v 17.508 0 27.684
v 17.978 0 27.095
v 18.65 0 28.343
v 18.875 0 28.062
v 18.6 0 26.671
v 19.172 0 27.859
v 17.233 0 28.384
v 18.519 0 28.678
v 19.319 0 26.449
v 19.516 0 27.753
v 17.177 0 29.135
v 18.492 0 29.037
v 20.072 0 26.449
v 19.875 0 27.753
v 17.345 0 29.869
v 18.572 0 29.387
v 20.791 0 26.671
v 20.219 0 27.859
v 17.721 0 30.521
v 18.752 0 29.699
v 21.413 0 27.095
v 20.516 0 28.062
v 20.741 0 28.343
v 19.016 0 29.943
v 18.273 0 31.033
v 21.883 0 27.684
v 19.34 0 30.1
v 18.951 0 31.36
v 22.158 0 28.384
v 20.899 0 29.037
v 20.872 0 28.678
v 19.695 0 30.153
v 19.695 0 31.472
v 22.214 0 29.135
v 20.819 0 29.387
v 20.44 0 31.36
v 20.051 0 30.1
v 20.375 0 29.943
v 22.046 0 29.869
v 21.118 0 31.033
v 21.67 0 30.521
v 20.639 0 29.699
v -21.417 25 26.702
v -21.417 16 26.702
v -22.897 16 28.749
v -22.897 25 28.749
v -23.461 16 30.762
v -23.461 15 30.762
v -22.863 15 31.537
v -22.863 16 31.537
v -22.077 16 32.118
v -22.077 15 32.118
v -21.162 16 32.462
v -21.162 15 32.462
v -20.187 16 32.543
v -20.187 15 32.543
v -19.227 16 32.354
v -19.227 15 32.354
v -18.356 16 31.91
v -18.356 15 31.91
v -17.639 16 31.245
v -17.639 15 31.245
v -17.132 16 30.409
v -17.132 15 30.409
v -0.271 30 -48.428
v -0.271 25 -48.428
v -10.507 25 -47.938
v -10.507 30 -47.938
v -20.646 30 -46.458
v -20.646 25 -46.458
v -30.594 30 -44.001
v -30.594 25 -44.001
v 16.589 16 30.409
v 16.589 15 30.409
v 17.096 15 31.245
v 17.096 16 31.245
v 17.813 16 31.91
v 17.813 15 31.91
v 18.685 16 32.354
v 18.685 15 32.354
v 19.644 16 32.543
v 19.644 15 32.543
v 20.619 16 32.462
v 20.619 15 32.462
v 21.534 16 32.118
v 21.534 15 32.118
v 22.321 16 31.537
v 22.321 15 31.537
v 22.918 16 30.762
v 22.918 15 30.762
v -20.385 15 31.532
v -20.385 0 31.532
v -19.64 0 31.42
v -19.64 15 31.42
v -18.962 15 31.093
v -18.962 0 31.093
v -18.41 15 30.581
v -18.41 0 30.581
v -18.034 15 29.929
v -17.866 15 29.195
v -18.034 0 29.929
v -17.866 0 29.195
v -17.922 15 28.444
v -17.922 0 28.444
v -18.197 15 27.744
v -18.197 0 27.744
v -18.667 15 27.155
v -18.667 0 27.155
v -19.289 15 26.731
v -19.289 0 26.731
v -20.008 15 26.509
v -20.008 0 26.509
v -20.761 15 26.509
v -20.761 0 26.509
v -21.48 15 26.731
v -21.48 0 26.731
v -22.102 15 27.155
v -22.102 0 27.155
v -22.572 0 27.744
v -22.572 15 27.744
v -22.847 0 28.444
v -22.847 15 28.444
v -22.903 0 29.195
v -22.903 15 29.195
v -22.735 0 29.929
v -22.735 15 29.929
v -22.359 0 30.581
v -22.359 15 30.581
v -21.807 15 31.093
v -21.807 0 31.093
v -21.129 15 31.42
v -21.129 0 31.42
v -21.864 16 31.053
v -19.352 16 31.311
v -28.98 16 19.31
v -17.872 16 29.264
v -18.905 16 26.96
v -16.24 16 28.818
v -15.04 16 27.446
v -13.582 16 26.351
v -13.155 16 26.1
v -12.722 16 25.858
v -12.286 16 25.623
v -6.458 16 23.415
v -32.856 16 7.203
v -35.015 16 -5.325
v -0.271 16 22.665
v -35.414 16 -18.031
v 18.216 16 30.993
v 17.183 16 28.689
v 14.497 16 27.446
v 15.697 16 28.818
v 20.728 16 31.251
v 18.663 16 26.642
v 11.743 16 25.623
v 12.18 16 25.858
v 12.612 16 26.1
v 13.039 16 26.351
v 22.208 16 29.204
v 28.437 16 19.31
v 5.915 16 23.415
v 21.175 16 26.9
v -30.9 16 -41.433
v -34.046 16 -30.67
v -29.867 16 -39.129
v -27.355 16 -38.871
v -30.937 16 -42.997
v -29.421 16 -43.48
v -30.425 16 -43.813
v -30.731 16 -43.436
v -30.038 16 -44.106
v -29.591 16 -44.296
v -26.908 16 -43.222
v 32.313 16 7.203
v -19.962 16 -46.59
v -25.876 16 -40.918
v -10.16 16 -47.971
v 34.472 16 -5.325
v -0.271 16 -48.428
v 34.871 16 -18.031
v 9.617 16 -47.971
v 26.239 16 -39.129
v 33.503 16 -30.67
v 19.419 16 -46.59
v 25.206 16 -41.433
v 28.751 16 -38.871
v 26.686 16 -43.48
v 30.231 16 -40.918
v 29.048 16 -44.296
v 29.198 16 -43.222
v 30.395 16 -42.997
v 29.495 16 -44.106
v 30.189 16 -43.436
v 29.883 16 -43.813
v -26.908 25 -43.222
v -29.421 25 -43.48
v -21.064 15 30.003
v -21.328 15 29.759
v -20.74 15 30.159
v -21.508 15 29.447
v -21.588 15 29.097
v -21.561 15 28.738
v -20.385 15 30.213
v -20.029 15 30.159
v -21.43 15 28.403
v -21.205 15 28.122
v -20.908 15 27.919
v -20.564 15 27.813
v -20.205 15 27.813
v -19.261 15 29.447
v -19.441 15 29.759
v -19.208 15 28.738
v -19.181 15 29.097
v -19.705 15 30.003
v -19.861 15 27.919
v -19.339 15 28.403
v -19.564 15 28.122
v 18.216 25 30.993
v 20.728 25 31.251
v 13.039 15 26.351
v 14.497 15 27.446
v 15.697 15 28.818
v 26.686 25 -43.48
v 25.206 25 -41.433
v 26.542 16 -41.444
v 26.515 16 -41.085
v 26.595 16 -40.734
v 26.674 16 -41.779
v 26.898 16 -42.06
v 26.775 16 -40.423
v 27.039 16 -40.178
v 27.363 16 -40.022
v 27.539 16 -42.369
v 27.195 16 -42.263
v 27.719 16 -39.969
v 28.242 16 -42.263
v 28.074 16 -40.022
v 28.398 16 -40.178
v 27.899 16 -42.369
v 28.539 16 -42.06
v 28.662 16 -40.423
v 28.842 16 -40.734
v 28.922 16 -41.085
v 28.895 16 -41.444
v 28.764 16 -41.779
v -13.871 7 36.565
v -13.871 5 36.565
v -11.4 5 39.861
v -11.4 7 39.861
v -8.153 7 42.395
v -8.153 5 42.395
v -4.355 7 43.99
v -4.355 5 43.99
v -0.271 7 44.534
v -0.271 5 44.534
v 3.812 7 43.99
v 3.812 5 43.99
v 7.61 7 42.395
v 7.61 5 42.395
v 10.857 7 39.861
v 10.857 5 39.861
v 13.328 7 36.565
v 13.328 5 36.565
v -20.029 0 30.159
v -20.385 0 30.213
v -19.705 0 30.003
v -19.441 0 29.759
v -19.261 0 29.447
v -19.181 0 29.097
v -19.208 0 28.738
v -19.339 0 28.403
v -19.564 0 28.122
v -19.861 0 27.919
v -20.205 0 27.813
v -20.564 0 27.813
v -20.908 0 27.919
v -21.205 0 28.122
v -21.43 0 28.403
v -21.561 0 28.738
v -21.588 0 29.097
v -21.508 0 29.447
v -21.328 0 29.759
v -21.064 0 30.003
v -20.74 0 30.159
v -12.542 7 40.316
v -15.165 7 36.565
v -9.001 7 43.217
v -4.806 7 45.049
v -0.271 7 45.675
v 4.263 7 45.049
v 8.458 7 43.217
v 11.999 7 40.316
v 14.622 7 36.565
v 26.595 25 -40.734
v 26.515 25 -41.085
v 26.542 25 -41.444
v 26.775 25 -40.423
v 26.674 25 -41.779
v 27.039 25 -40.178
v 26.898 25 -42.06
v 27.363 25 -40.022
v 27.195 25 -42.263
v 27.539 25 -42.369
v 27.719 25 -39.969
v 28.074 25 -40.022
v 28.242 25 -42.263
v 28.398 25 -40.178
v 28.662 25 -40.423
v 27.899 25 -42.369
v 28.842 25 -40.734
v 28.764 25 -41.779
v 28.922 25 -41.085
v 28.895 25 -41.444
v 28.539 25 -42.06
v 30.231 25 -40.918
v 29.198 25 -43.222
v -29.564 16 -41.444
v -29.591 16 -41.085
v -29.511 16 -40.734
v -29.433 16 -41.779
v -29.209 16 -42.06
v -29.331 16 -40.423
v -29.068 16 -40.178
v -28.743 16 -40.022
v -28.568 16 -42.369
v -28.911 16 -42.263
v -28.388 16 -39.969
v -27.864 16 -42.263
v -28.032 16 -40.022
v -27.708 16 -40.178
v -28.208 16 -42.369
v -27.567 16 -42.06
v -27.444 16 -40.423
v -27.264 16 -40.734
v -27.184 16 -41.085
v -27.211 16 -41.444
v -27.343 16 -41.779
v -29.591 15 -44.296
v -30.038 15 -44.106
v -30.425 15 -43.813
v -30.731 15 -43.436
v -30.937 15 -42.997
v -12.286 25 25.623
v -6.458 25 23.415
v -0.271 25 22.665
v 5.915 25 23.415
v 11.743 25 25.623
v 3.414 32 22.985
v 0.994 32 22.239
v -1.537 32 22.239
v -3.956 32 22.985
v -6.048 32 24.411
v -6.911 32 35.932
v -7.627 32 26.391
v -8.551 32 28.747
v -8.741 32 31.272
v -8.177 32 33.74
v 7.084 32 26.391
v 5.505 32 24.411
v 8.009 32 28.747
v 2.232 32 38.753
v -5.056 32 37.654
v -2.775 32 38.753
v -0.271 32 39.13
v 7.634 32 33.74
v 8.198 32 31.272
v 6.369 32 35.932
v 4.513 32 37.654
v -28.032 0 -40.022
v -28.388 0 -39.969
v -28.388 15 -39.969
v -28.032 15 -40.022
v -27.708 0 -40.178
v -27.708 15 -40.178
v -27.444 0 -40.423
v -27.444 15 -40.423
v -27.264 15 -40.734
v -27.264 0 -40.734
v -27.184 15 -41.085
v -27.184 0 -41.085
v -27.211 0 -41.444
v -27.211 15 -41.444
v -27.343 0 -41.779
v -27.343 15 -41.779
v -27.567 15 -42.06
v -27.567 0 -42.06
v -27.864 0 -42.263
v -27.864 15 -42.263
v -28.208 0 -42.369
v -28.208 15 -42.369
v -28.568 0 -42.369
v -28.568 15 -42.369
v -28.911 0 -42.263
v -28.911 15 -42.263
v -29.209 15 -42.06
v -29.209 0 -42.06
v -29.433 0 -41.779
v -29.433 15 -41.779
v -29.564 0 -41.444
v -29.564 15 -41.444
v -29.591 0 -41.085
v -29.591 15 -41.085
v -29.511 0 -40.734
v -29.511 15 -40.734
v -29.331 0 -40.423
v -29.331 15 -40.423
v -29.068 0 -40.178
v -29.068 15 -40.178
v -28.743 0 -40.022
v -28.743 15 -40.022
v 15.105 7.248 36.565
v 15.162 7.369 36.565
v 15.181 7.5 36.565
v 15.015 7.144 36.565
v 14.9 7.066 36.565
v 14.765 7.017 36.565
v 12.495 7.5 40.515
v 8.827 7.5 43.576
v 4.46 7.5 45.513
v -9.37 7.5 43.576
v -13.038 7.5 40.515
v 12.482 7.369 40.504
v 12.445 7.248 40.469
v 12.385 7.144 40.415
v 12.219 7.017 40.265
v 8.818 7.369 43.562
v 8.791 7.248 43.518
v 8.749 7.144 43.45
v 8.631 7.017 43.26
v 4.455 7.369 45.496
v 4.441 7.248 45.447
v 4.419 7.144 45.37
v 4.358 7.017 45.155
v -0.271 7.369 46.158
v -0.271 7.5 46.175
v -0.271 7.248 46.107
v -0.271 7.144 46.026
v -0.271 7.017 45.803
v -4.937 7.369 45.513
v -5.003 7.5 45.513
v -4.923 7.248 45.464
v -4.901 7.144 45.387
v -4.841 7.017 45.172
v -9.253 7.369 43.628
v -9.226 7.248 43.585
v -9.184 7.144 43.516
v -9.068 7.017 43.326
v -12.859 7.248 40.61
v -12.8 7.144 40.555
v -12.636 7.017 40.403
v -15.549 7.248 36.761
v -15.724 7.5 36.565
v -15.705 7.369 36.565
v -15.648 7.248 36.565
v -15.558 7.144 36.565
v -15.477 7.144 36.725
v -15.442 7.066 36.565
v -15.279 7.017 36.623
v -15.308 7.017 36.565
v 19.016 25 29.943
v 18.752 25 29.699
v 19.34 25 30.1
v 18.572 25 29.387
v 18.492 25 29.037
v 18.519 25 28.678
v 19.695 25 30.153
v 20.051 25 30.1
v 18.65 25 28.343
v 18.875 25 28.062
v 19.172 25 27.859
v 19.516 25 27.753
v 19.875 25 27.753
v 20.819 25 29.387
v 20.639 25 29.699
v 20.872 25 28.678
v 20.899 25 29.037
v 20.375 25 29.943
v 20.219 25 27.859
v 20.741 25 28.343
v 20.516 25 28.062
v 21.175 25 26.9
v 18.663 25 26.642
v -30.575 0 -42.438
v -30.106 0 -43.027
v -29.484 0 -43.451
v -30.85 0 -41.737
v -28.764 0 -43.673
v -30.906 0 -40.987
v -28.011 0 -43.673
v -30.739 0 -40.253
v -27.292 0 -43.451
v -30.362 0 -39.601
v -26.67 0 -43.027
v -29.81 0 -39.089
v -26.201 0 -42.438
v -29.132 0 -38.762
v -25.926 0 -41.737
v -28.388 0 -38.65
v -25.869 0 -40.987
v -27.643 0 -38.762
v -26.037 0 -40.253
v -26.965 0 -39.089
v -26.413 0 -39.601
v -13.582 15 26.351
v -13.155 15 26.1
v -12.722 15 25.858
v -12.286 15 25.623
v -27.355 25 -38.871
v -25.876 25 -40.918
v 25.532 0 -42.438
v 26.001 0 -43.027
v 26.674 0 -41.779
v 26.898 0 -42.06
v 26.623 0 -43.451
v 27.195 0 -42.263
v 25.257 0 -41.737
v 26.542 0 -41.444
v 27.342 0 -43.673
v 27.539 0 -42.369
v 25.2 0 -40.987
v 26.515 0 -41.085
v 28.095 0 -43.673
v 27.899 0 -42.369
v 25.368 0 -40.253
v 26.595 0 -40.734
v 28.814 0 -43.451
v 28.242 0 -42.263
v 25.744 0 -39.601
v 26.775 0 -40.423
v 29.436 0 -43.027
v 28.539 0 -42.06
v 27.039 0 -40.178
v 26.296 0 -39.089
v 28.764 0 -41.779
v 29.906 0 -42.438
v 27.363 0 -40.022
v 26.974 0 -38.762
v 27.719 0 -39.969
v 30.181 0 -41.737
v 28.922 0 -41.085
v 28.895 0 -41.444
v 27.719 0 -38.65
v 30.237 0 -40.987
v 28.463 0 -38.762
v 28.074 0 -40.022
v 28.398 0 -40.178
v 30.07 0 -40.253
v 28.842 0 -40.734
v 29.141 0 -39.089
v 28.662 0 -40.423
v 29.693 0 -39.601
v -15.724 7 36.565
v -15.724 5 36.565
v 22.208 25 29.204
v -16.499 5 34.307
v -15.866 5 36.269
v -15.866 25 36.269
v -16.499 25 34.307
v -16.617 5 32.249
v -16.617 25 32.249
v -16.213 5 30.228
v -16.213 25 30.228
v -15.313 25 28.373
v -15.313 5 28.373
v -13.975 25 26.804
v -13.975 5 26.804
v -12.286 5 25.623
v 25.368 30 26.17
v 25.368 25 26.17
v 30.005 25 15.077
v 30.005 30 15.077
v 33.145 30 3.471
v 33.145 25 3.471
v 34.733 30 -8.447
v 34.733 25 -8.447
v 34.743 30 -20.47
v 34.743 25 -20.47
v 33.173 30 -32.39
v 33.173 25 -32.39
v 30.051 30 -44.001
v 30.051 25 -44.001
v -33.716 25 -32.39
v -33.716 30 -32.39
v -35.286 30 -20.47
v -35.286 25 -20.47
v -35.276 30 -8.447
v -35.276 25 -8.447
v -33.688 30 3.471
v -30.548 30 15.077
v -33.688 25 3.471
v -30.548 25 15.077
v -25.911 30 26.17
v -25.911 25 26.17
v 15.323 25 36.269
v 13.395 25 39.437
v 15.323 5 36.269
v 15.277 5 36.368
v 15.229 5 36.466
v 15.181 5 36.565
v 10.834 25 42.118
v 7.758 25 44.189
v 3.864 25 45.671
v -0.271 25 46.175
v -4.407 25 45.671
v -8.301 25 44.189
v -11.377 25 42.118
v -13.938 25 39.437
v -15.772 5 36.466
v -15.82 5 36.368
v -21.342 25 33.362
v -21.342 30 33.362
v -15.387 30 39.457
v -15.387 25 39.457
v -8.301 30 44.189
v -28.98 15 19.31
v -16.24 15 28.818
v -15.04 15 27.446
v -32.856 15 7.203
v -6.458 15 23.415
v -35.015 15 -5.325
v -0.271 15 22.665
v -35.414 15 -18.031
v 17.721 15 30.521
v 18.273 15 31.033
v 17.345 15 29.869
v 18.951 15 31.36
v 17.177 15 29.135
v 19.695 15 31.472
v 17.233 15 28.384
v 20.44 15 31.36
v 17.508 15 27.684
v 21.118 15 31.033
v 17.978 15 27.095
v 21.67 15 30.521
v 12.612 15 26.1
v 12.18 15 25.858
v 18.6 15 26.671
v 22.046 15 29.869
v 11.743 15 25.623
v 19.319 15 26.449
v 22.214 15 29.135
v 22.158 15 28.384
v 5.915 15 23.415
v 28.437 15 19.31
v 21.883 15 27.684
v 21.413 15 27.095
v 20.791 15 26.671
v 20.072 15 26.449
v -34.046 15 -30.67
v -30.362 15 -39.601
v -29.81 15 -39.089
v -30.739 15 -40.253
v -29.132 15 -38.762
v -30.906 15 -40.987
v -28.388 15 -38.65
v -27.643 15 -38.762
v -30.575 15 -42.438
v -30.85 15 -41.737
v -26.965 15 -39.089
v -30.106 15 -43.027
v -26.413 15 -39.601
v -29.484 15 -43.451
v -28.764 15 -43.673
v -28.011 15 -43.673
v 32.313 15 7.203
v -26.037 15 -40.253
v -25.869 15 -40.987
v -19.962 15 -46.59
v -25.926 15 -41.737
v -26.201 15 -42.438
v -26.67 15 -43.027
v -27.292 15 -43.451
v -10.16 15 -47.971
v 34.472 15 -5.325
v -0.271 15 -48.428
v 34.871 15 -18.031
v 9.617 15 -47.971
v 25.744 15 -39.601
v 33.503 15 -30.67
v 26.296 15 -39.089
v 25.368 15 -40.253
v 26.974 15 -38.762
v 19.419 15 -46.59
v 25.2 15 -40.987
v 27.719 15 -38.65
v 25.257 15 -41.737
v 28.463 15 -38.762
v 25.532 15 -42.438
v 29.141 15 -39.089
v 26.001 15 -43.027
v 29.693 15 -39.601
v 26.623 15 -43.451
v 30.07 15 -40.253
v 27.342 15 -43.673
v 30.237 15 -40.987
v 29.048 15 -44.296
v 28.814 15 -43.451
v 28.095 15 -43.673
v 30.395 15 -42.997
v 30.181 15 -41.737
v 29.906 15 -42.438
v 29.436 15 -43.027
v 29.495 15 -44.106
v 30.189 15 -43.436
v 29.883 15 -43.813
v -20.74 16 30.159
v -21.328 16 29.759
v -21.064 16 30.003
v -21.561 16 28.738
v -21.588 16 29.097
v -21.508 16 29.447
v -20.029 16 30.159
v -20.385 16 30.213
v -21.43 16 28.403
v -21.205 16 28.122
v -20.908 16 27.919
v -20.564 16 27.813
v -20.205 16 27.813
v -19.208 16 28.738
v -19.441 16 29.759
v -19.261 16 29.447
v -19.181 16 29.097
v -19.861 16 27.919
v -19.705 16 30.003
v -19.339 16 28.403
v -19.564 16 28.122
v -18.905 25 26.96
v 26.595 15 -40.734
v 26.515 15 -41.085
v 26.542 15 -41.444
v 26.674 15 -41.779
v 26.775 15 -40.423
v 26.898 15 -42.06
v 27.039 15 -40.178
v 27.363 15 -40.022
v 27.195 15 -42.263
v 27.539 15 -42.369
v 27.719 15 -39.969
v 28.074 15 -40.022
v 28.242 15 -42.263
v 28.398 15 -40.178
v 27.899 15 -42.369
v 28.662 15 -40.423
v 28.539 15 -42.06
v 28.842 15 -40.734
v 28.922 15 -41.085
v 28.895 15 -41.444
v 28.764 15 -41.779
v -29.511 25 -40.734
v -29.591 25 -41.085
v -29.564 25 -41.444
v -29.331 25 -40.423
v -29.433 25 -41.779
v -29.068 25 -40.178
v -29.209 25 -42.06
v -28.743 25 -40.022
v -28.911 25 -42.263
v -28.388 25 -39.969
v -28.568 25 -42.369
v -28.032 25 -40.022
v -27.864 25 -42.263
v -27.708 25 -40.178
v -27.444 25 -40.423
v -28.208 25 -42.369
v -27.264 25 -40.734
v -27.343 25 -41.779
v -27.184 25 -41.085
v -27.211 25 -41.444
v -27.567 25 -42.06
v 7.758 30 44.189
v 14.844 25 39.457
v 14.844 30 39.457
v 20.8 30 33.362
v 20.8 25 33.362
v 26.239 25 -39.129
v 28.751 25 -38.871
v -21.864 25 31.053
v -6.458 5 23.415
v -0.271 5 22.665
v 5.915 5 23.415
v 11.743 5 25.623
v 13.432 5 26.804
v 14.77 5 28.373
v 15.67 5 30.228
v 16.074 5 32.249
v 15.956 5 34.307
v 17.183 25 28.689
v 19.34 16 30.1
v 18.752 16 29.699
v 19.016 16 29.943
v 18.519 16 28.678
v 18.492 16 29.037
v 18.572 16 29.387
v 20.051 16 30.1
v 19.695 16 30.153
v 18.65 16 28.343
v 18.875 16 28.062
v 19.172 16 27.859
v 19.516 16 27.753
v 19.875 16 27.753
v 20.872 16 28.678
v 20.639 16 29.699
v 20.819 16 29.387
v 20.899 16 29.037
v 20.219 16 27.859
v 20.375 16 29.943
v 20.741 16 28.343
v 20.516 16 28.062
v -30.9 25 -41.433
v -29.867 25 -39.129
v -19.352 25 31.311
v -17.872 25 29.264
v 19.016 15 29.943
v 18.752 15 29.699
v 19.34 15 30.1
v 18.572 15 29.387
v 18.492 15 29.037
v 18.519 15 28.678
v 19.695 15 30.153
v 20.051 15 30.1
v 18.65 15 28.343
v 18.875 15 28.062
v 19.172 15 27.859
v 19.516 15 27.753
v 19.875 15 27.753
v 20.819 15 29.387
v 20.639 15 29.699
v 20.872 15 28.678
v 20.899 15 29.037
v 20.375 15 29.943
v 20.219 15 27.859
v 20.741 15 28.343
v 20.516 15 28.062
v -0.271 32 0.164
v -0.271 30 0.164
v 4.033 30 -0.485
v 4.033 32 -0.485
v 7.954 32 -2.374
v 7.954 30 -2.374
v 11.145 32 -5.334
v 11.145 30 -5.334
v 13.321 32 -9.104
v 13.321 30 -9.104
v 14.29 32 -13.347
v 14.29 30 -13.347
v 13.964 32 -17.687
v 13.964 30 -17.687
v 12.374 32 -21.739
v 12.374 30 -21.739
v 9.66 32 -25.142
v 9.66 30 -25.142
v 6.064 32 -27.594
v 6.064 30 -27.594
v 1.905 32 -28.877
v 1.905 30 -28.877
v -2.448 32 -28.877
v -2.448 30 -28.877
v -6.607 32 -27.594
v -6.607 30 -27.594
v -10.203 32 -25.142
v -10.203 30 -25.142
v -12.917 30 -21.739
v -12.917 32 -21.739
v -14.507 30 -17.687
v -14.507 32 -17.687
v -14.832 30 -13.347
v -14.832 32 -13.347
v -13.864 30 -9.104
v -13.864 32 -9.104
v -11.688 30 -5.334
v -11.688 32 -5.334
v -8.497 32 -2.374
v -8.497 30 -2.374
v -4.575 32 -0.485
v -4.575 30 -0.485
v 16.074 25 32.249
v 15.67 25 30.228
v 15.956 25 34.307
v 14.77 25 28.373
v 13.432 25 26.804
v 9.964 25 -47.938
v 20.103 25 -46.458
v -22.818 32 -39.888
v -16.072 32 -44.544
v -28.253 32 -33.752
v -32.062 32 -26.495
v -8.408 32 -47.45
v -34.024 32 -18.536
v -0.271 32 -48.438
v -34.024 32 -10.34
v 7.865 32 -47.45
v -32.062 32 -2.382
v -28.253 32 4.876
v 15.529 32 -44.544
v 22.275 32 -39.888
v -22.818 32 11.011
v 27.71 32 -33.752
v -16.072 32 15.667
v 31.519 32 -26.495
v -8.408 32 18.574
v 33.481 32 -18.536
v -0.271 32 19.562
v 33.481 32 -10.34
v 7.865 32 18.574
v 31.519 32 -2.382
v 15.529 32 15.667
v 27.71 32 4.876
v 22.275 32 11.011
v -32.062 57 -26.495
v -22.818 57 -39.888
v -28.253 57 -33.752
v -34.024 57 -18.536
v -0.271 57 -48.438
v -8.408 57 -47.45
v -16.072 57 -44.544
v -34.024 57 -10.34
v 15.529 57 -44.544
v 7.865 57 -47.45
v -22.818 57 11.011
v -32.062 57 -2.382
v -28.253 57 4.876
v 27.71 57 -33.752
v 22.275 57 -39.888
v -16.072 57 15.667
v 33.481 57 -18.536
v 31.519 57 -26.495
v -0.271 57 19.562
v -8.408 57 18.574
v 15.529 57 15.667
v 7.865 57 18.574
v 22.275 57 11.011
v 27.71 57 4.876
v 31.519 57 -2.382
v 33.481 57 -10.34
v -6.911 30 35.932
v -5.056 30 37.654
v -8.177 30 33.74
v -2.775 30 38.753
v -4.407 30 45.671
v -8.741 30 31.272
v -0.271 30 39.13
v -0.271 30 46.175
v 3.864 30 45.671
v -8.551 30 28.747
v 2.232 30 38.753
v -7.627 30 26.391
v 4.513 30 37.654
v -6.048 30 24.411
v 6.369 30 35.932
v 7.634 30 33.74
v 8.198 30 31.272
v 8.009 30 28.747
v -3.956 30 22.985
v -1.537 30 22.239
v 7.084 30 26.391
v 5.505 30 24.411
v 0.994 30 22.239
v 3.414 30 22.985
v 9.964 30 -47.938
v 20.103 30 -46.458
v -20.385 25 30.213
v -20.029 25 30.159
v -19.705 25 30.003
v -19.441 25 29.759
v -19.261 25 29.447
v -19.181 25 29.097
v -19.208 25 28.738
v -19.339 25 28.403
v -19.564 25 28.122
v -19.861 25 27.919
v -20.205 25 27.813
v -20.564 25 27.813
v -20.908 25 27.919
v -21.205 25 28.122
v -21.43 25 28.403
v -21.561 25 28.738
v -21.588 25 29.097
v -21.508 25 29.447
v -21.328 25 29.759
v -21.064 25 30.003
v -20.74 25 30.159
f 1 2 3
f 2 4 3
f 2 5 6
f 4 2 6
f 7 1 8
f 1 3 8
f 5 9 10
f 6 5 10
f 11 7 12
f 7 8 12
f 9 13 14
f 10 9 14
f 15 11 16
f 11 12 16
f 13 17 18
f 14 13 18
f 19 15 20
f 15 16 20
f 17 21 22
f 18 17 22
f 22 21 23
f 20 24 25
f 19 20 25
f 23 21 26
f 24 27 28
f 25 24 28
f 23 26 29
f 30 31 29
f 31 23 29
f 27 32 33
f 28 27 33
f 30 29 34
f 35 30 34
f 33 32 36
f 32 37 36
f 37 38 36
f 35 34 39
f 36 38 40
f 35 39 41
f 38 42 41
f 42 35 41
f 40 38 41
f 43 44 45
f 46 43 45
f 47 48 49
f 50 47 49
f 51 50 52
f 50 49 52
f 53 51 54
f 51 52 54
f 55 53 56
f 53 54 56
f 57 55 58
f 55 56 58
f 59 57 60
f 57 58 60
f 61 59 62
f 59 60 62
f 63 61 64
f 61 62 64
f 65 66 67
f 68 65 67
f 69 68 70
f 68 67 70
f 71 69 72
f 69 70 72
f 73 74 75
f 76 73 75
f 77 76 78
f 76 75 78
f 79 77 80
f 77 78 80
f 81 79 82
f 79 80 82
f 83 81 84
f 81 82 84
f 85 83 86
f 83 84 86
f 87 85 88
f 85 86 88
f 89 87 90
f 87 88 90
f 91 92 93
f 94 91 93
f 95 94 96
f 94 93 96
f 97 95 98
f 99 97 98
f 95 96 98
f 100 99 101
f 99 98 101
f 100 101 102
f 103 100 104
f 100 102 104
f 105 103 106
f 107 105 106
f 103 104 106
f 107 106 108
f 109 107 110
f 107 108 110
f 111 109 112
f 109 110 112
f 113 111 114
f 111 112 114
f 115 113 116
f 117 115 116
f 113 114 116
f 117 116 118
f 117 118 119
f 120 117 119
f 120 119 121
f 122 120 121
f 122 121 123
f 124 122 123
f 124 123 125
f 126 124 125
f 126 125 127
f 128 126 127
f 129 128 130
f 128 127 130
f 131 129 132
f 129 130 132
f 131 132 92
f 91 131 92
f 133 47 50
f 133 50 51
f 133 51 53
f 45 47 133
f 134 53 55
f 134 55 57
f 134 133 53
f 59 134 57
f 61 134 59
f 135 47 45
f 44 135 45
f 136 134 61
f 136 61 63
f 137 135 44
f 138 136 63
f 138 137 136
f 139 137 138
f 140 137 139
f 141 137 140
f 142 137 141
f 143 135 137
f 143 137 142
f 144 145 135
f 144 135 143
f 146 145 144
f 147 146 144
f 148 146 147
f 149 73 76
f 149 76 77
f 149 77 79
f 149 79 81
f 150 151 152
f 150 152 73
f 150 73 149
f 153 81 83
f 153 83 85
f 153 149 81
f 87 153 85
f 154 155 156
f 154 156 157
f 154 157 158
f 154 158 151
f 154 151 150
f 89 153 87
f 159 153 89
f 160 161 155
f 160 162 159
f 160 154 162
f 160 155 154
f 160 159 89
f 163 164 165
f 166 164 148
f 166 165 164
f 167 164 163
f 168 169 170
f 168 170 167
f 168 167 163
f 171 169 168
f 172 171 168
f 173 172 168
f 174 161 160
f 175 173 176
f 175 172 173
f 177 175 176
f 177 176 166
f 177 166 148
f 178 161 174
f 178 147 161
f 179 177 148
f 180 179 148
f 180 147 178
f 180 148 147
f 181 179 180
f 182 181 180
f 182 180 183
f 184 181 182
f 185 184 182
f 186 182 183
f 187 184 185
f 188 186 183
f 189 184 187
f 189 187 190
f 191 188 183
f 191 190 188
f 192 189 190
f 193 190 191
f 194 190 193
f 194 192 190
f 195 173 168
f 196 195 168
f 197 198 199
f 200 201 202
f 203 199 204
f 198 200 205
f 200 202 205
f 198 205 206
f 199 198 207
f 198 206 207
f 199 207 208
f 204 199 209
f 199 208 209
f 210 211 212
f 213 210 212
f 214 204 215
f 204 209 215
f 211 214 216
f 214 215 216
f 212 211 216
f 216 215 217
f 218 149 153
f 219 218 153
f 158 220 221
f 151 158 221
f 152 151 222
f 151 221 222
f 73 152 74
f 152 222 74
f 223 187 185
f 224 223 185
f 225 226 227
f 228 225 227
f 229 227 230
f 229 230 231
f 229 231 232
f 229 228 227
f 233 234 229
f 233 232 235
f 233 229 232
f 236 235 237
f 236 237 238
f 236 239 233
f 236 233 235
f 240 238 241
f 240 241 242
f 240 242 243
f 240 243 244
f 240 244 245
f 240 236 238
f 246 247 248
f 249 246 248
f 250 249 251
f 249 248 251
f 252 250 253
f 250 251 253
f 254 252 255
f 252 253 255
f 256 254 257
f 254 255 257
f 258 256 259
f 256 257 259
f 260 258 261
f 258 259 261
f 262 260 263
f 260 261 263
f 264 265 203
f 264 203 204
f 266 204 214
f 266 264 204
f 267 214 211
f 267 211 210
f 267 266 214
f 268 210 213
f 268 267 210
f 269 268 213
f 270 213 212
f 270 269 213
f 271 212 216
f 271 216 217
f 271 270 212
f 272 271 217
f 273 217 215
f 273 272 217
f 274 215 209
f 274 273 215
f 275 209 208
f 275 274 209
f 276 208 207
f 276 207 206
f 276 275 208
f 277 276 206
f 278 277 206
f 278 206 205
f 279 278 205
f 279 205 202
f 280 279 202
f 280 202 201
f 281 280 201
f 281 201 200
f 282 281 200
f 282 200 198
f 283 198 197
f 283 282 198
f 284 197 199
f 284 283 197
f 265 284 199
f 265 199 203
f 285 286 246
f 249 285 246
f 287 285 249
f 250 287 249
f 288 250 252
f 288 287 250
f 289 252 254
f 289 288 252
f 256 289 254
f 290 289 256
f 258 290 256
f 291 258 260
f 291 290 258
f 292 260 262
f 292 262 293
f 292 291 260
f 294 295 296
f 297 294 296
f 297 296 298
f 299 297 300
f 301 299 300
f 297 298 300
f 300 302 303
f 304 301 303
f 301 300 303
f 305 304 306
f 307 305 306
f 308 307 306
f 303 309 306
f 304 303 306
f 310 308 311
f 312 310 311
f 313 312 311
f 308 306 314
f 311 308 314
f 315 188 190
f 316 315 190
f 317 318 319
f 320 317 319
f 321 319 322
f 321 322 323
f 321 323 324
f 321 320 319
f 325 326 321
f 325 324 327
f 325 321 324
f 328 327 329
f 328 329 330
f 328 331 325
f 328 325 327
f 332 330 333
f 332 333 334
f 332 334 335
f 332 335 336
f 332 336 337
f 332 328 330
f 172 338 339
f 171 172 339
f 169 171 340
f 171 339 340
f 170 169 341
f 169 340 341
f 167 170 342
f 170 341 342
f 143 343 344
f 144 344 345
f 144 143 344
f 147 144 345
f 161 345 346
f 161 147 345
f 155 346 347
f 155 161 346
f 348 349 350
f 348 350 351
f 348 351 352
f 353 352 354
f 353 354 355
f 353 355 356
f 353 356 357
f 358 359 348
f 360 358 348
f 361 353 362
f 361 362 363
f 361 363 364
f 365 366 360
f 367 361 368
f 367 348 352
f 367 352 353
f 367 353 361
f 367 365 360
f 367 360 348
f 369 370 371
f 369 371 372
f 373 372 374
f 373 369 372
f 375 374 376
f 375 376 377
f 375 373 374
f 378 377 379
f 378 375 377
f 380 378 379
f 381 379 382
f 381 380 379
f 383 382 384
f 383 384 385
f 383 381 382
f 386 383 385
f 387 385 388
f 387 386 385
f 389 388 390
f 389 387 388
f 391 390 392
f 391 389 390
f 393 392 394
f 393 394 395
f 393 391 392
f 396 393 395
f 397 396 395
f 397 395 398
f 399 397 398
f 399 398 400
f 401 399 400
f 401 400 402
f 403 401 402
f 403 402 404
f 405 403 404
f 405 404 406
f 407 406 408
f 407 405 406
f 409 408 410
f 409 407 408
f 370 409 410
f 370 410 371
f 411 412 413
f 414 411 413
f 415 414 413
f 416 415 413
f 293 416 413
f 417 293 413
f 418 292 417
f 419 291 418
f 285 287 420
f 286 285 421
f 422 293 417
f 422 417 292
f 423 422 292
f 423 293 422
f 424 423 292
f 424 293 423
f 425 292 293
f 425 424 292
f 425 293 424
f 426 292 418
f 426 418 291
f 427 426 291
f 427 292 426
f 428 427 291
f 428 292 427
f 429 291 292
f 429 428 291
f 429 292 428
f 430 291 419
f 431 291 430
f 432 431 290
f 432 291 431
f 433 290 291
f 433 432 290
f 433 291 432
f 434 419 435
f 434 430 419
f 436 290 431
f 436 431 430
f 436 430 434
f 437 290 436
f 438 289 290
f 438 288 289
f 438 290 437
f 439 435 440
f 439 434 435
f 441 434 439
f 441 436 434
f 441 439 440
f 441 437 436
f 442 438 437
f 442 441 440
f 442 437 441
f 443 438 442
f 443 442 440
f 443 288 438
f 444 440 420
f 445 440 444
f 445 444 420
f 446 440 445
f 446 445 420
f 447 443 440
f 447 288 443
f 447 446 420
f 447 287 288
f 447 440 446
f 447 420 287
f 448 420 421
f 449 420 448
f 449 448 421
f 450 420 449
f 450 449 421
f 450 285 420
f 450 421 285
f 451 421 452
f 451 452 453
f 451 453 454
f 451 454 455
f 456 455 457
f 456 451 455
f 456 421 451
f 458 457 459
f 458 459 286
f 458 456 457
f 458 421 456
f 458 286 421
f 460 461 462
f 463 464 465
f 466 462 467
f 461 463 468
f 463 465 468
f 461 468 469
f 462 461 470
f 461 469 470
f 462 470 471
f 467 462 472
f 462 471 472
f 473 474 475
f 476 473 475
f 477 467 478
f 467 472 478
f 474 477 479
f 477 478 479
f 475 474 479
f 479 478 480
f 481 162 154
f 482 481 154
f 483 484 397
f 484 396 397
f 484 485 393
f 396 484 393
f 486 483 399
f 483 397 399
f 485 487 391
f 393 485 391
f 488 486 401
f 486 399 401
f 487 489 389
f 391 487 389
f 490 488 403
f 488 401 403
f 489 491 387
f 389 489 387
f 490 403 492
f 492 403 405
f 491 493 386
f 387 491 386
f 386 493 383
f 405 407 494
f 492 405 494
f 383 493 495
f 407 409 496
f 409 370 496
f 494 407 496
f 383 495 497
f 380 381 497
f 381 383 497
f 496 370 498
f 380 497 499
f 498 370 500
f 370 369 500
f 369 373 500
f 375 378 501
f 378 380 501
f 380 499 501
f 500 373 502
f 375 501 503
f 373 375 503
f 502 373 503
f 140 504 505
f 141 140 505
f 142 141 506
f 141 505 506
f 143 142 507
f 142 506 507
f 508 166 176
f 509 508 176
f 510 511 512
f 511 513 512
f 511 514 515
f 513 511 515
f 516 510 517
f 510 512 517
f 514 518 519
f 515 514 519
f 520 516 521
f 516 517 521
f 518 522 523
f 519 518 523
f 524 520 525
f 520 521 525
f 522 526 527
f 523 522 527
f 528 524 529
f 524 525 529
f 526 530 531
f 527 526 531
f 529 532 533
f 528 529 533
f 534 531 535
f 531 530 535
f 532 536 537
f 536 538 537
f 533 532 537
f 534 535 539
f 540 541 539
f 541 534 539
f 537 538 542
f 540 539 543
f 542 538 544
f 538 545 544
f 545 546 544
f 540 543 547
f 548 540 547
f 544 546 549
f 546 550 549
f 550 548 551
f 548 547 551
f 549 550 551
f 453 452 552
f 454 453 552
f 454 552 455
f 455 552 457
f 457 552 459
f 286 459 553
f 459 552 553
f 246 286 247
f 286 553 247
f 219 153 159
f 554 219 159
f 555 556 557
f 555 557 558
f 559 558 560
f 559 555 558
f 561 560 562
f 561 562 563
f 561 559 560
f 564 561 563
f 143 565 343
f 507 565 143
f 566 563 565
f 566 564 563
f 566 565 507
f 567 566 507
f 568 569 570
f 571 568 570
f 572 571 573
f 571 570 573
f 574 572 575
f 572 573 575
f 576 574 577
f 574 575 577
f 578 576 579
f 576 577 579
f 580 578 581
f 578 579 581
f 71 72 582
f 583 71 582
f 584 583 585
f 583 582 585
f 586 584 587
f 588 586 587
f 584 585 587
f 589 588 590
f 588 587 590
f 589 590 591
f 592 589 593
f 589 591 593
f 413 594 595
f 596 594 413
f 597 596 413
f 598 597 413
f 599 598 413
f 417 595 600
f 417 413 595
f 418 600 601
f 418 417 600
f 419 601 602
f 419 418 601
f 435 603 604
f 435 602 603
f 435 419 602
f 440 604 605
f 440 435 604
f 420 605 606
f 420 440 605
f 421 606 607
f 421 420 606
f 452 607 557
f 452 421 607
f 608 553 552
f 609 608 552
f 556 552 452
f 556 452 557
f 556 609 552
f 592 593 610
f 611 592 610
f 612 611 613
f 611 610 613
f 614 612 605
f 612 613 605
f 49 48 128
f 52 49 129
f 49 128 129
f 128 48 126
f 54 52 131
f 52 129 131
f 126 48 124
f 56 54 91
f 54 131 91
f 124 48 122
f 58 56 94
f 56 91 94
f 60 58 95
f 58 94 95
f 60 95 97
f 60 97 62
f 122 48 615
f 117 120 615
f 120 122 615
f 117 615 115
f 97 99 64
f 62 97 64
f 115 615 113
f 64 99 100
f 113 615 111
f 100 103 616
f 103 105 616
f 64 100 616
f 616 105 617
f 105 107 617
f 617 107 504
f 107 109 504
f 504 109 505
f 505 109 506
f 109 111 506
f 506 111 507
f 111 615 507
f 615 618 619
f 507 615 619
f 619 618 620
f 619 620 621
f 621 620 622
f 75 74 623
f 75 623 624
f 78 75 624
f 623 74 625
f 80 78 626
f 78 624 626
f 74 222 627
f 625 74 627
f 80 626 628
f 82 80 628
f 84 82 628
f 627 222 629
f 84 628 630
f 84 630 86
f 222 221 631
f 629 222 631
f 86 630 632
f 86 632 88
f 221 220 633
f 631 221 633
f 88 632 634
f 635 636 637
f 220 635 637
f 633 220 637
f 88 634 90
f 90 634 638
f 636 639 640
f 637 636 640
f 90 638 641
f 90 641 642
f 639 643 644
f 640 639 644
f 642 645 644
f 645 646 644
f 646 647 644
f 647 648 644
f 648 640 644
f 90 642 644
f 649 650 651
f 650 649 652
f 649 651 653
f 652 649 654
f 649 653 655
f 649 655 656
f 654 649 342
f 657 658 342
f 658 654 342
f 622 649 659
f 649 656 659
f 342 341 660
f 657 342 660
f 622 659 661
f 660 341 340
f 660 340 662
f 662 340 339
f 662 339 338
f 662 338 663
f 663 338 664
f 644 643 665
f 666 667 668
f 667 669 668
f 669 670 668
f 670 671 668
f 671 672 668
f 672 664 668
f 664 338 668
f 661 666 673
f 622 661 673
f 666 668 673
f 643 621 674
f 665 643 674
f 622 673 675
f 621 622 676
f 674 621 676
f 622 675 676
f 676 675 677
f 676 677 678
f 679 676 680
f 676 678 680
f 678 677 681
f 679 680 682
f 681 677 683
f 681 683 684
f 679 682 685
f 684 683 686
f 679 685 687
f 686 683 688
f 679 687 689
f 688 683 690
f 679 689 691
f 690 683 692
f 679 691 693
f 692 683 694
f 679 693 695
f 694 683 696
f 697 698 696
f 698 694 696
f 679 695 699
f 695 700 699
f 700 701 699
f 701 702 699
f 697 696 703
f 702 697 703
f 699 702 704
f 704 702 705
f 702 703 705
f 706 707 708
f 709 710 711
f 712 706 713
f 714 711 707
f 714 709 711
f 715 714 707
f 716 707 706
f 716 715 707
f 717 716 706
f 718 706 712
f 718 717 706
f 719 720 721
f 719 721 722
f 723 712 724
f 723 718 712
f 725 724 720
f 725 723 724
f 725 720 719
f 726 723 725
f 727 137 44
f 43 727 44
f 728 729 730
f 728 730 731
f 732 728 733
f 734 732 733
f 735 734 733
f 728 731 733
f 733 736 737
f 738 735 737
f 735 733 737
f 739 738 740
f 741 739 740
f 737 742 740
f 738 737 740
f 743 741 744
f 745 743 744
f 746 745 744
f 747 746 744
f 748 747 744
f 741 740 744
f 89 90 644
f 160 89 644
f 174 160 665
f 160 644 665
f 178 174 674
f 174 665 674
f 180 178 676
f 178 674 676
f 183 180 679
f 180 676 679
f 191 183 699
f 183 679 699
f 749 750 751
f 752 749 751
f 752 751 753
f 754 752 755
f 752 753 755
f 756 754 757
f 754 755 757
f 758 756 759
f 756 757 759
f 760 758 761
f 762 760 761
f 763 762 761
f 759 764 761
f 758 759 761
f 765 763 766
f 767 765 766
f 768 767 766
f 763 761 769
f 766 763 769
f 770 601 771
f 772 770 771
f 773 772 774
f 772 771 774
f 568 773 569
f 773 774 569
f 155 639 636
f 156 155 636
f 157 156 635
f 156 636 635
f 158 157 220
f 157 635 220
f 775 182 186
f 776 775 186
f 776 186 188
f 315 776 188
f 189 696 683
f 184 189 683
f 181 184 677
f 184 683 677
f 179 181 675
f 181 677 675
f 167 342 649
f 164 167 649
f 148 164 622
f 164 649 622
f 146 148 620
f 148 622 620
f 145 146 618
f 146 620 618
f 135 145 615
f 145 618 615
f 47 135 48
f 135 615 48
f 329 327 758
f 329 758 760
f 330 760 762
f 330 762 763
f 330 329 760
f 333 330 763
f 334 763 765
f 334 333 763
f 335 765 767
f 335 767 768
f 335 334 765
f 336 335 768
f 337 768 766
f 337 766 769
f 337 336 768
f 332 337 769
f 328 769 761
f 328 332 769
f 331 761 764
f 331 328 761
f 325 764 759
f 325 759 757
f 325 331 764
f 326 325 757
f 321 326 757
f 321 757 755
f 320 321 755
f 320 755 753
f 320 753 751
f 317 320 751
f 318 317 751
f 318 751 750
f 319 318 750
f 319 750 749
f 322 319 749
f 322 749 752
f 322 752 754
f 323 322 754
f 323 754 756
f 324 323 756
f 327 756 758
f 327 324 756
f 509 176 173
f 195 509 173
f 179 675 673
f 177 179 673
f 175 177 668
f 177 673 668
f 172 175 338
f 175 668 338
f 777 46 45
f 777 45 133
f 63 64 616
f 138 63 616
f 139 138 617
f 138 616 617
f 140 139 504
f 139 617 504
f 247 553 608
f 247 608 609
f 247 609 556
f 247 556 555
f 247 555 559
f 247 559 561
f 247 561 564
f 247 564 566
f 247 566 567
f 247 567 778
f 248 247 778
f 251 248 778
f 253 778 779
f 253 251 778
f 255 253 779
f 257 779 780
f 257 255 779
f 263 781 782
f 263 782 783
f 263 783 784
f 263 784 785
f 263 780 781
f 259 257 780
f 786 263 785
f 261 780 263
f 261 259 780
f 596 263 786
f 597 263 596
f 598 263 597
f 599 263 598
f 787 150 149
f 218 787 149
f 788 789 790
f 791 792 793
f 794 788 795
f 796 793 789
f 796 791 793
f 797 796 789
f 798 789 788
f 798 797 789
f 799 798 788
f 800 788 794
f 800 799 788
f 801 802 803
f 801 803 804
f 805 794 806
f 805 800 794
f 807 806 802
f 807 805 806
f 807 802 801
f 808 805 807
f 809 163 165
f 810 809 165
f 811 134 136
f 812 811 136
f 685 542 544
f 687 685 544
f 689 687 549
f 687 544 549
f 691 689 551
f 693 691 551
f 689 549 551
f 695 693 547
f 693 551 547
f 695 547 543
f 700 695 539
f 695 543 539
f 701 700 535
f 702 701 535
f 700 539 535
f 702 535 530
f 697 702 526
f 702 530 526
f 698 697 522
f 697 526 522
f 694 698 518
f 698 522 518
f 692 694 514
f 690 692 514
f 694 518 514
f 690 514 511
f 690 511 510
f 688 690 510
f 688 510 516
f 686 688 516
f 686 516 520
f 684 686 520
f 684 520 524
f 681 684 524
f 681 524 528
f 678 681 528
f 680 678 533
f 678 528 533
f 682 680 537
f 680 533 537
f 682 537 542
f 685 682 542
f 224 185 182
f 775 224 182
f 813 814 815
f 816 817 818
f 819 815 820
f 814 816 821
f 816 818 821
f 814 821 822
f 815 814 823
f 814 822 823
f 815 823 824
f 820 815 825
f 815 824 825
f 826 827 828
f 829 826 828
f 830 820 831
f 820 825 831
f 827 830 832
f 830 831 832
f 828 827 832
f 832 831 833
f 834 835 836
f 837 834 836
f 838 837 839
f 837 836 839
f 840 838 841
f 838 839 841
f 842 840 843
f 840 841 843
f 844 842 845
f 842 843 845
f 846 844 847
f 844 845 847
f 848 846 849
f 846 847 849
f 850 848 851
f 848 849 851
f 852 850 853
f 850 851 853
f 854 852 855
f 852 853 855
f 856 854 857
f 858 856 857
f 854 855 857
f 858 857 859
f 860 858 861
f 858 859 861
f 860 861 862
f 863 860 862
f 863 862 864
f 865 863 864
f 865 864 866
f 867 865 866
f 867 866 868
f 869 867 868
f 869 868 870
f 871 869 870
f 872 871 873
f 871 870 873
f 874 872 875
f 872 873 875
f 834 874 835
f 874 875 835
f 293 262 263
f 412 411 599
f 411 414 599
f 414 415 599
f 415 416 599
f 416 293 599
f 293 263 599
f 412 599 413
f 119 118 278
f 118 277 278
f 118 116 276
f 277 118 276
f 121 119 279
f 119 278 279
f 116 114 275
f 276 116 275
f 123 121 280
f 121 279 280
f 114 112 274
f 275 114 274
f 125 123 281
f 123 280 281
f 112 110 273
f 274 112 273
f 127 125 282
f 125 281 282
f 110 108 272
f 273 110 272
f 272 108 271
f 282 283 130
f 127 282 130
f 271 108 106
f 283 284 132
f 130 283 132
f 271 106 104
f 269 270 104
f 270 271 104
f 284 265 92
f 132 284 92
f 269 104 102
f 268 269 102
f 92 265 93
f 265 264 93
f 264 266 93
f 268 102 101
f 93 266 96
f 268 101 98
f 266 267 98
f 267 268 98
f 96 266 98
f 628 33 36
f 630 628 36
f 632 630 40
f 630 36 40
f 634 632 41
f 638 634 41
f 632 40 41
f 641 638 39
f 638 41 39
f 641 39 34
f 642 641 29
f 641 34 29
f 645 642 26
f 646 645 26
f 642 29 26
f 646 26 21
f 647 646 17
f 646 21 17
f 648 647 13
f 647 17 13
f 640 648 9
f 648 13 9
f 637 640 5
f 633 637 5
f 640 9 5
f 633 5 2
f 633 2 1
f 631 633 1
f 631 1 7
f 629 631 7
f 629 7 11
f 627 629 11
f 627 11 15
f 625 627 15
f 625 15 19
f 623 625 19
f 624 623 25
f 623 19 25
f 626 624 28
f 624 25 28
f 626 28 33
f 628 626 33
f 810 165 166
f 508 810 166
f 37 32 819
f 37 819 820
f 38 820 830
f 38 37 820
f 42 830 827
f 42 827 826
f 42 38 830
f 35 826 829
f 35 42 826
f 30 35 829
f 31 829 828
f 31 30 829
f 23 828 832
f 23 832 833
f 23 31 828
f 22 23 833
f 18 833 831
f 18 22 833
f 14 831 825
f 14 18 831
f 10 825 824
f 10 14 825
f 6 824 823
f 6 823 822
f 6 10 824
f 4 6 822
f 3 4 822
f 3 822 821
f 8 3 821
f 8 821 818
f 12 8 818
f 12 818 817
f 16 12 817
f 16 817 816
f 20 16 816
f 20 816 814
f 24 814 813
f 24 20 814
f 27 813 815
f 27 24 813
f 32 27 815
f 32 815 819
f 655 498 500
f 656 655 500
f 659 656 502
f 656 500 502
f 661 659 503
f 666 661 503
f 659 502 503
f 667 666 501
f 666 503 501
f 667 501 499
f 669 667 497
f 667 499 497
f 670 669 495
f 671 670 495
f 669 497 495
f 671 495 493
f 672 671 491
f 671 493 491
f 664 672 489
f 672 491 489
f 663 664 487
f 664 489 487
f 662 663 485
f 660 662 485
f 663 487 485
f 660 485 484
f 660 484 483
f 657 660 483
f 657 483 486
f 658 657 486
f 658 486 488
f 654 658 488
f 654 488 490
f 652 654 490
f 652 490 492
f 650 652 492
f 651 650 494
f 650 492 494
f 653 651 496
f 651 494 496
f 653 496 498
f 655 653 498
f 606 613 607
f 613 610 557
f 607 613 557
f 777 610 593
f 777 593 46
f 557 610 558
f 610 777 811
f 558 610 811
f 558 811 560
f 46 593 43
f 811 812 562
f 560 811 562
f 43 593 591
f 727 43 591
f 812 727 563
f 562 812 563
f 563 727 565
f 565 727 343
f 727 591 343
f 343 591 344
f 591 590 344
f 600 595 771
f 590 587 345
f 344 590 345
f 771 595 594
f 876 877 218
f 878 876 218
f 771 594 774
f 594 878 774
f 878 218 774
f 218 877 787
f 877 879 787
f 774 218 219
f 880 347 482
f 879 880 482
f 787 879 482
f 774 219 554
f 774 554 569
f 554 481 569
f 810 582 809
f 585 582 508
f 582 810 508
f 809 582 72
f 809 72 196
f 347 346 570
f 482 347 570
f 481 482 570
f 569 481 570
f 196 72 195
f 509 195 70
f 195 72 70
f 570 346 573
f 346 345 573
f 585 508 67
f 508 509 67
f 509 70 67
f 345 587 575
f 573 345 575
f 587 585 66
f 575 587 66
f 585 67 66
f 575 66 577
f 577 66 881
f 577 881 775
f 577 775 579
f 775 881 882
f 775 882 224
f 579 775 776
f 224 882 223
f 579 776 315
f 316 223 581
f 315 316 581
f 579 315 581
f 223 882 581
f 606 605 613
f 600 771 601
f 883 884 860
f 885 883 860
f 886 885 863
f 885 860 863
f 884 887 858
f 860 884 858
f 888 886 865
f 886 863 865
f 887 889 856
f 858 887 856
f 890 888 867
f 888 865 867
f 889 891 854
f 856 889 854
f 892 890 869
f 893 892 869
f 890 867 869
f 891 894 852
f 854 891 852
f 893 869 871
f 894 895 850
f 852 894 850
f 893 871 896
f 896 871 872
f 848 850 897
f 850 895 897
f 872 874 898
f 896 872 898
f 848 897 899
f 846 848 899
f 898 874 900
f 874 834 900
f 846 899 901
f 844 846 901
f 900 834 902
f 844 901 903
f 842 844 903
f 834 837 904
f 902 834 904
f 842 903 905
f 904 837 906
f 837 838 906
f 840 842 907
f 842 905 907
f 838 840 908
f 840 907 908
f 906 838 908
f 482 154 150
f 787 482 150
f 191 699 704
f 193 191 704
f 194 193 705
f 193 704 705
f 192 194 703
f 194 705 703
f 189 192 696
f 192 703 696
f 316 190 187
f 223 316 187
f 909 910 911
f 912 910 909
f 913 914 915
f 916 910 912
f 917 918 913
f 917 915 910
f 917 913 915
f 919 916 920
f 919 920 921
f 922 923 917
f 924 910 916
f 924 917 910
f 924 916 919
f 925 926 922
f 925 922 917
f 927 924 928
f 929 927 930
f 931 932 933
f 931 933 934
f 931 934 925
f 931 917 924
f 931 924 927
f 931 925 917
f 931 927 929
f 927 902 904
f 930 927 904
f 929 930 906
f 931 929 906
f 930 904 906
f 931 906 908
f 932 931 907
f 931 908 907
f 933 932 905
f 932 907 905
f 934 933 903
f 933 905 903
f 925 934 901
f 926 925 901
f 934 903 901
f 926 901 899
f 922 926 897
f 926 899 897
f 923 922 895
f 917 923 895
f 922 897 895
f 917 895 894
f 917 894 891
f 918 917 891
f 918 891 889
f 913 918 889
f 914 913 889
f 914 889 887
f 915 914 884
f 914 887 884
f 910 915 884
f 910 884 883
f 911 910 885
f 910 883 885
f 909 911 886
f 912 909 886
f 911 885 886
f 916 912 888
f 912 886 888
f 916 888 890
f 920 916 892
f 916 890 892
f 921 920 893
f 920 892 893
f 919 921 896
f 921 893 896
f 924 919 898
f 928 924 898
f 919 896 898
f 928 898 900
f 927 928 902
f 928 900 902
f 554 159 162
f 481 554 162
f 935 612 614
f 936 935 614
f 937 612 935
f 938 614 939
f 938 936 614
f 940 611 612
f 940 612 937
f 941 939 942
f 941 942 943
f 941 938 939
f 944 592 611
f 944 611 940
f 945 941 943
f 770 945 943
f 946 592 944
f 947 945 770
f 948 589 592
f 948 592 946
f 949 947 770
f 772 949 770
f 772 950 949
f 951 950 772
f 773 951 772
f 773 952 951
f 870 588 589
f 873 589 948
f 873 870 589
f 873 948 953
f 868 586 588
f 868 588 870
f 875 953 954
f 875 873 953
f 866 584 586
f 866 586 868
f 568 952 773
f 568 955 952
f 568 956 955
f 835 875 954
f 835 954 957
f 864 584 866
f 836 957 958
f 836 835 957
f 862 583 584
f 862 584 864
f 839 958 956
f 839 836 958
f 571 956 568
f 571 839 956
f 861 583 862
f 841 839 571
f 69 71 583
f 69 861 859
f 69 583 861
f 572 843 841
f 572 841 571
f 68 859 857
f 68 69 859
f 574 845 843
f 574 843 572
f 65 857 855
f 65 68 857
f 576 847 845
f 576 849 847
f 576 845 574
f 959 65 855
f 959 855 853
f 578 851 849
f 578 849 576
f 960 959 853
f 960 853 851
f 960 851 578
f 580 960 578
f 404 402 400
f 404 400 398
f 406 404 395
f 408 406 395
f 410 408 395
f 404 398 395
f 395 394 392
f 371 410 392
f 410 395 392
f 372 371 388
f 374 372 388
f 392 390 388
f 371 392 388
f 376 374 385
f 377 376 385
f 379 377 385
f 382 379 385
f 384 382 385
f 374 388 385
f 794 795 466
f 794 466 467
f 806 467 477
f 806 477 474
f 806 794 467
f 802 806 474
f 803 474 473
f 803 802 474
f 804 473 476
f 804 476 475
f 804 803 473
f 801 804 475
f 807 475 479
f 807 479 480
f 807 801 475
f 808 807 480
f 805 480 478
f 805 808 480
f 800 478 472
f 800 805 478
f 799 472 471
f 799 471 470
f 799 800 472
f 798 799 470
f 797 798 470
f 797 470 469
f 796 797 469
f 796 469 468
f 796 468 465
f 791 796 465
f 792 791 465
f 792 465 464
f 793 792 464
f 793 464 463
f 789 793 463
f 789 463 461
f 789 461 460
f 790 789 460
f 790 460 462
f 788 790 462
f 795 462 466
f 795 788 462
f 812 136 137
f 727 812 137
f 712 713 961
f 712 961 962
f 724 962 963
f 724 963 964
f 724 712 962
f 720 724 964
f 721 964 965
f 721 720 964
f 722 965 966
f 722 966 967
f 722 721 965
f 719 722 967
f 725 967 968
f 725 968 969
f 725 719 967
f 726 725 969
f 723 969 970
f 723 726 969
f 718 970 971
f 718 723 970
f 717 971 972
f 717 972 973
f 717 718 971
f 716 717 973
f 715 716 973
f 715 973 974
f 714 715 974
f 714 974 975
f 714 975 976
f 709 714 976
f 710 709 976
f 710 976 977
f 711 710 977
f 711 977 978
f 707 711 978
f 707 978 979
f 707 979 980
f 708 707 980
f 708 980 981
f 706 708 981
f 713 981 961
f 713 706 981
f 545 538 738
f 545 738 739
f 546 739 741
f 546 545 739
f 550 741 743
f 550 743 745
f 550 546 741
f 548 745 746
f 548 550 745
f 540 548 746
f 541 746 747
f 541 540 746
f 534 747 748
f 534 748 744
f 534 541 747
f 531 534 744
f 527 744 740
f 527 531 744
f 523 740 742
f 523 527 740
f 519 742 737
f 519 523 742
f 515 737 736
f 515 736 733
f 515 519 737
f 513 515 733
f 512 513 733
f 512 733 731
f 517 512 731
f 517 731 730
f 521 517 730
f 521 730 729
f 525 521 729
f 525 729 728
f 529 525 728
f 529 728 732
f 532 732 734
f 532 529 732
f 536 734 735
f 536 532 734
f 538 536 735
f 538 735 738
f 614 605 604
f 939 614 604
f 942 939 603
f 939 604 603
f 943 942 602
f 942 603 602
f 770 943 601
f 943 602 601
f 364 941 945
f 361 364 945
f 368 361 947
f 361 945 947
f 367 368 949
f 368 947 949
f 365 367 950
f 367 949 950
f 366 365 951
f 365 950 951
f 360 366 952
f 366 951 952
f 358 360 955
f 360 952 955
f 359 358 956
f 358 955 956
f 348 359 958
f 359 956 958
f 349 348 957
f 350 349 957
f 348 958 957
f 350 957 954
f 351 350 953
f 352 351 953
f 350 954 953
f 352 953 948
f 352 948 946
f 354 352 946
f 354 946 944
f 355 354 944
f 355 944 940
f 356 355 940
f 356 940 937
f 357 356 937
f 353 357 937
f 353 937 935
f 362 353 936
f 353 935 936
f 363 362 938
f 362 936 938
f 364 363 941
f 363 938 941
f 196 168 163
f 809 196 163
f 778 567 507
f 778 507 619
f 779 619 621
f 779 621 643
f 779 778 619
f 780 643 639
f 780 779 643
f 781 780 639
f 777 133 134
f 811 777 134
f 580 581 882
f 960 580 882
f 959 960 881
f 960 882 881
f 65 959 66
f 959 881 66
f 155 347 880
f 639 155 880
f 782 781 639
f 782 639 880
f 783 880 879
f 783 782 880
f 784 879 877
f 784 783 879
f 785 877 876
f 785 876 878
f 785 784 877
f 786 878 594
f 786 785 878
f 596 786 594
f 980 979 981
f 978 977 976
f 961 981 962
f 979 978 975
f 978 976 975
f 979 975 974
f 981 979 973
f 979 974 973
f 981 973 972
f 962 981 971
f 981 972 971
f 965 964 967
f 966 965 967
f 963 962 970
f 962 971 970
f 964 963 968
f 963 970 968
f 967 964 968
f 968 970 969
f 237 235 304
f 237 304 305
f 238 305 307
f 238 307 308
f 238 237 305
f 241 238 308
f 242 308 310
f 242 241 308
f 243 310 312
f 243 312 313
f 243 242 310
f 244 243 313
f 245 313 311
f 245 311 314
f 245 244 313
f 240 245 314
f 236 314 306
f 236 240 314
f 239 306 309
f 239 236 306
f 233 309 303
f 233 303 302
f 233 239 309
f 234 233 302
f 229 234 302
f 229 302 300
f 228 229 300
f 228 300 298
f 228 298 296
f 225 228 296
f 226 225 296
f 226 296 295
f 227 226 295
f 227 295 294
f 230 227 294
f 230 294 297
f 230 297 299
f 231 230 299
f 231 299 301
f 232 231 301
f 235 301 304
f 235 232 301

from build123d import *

# Parameters (mm, degrees)
SKETCH_1_R          = 2.525444103
SKETCH_1_R_2        = 1.206738485
EXTRUDE_1_DEPTH     = 15
EXTRUDE_1_2_DEPTH   = 15
EXTRUDE_1_3_DEPTH   = 15
EXTRUDE_1_4_DEPTH   = 15
EXTRUDE_2_DEPTH     = 1
SKETCH_3_R          = 1.206738485
EXTRUDE_3_DEPTH     = 9
EXTRUDE_4_DEPTH     = 5
EXTRUDE_START       = 20
EXTRUDE_5_DEPTH     = 20
CUT_EXTRUDE_1_DEPTH = 2
FILLET_1_R          = 0.5
SKETCH_7_R          = 14.601754061
SKETCH_7_R_2        = 8.492985931
EXTRUDE_6_DEPTH     = 2
SKETCH_8_R          = 34
EXTRUDE_7_DEPTH     = 25


with BuildPart() as part:
    # 草图1 → 凸台-拉伸1 (new body)
    with BuildSketch(Plane(origin=(0, 0, 0), x_dir=(1, 0, 0), z_dir=(0, 1, 0))):
        with Locations(Location((-28.387774848, 41.175361777, 0), (0, 0, 270))):
            Circle(SKETCH_1_R)
        with Locations(Location((-28.387774848, 41.175361777, 0), (0, 0, 270))):
            Circle(SKETCH_1_R_2, mode=Mode.SUBTRACT)
    extrude(amount=EXTRUDE_1_DEPTH)



with BuildPart() as body_2:
    # 草图1 → Extrude 1 2 (new body)
    with BuildSketch(Plane(origin=(0, 0, 0), x_dir=(1, 0, 0), z_dir=(0, 1, 0))):
        with Locations(Location((27.718646552, 41.175361777, 0), (0, 0, 270))):
            Circle(SKETCH_1_R)
        with Locations(Location((27.718646552, 41.175361777, 0), (0, 0, 270))):
            Circle(SKETCH_1_R_2, mode=Mode.SUBTRACT)
    extrude(amount=EXTRUDE_1_2_DEPTH)


with BuildPart() as body_3:
    # 草图1 → Extrude 1 3 (new body)
    with BuildSketch(Plane(origin=(0, 0, 0), x_dir=(1, 0, 0), z_dir=(0, 1, 0))):
        with Locations(Location((19.695499635, -28.946408229, 0), (0, 0, 270))):
            Circle(SKETCH_1_R)
        with Locations(Location((19.695499635, -28.946408229, 0), (0, 0, 270))):
            Circle(SKETCH_1_R_2, mode=Mode.SUBTRACT)
    extrude(amount=EXTRUDE_1_3_DEPTH)


with BuildPart() as body_4:
    # 草图1 → Extrude 1 4 (new body)
    with BuildSketch(Plane(origin=(0, 0, 0), x_dir=(1, 0, 0), z_dir=(0, 1, 0))):
        with Locations(Location((-20.384564295, -29.006371883, 0), (0, 0, 270))):
            Circle(SKETCH_1_R)
        with Locations(Location((-20.384564295, -29.006371883, 0), (0, 0, 270))):
            Circle(SKETCH_1_R_2, mode=Mode.SUBTRACT)
    extrude(amount=EXTRUDE_1_4_DEPTH)


with BuildPart() as part_1:
    add(part.part)

    add(body_2.part)  # 凸台-拉伸2 merges body 2

    add(body_3.part)  # 凸台-拉伸2 merges body 3

    add(body_4.part)  # 凸台-拉伸2 merges body 4
    # 草图2 → 凸台-拉伸2 (add)
    with BuildSketch(Plane(origin=(0, 15, 0), x_dir=(1, 0, 0), z_dir=(0, 1, 0))):
        with BuildLine():
            ThreePointArc((-0.271405212, 48.428059813), (-15.076874658, 47.395350678), (-29.591025821, 44.295700747))
            ThreePointArc((-29.591025821, 44.295700747), (-30.425446284, 43.813362835), (-30.937389258, 42.996771284))
            ThreePointArc((-30.937389258, 42.996771284), (-35.014604001, 5.325002623), (-23.460887401, -30.7623562))
            ThreePointArc((-23.460887401, -30.7623562), (-20.186933133, -32.543063374), (-17.131754901, -30.40868277))
            ThreePointArc((-17.131754901, -30.40868277), (-15.675739537, -28.10111065), (-13.582203175, -26.351260562))
            ThreePointArc((-13.582203175, -26.351260562), (-0.271405212, -22.664793676), (13.039392752, -26.351260562))
            ThreePointArc((13.039392752, -26.351260562), (15.132929113, -28.10111065), (16.588944478, -30.40868277))
            ThreePointArc((16.588944478, -30.40868277), (19.644122709, -32.543063374), (22.918076977, -30.7623562))
            ThreePointArc((22.918076977, -30.7623562), (34.471793578, 5.325002623), (30.394578834, 42.996771284))
            ThreePointArc((30.394578834, 42.996771284), (29.88263586, 43.813362835), (29.048215398, 44.295700747))
            ThreePointArc((29.048215398, 44.295700747), (14.534064235, 47.395350678), (-0.271405212, 48.428059813))
        make_face()
    extrude(amount=EXTRUDE_2_DEPTH)

    # 草图3 → 凸台-拉伸3 (add)
    # profile 1 of 4: a face of its own
    with BuildSketch(Plane(origin=(0, 16, 0), x_dir=(1, 0, 0), z_dir=(0, 1, 0))):
        Polygon((22.207746053, -29.204256732), (21.174926198, -26.899663262), (18.66267978, -26.641814759), (17.183253217, -28.688559726), (18.216073072, -30.993153196), (20.72831949, -31.251001699), align=None)
        with Locations(Location((19.695499635, -28.946408229, 0), (0, 0, 270))):
            Circle(SKETCH_3_R, mode=Mode.SUBTRACT)
    # profile 2 of 4: a face of its own
    with BuildSketch(Plane(origin=(0, 16, 0), x_dir=(1, 0, 0), z_dir=(0, 1, 0))):
        Polygon((-18.905137732, -26.959626916), (-21.41738415, -26.701778413), (-22.896810713, -28.74852338), (-21.863990858, -31.05311685), (-19.35174444, -31.310965353), (-17.872317877, -29.264220386), align=None)
        with Locations(Location((-20.384564295, -29.006371883, 0), (0, 0, 270))):
            Circle(SKETCH_3_R, mode=Mode.SUBTRACT)
    # profile 3 of 4: a face of its own
    with BuildSketch(Plane(origin=(0, 16, 0), x_dir=(1, 0, 0), z_dir=(0, 1, 0))):
        Polygon((26.685826697, 43.479955247), (25.206400134, 41.43321028), (26.239219989, 39.12861681), (28.751466407, 38.870768307), (30.23089297, 40.917513274), (29.198073115, 43.222106744), align=None)
        with Locations(Location((27.718646552, 41.175361777, 0), (0, 0, 270))):
            Circle(SKETCH_3_R, mode=Mode.SUBTRACT)
    # profile 4 of 4: a face of its own
    with BuildSketch(Plane(origin=(0, 16, 0), x_dir=(1, 0, 0), z_dir=(0, 1, 0))):
        Polygon((-30.900021266, 41.43321028), (-29.867201411, 39.12861681), (-27.354954993, 38.870768307), (-25.87552843, 40.917513274), (-26.908348285, 43.222106744), (-29.420594703, 43.479955247), align=None)
        with Locations(Location((-28.387774848, 41.175361777, 0), (0, 0, 270))):
            Circle(SKETCH_3_R, mode=Mode.SUBTRACT)
    extrude(amount=EXTRUDE_3_DEPTH)

    # 草图4 → 凸台-拉伸4 (add)
    with BuildSketch(Plane(origin=(0, 25, 0), x_dir=(1, 0, 0), z_dir=(0, 1, 0))):
        with BuildLine():
            ThreePointArc((-0.271405212, 48.428034147), (-15.594215434, 47.321055953), (-30.593831711, 44.000600361))
            ThreePointArc((-30.593831711, 44.000600361), (-35.27623055, 8.446713655), (-25.910625184, -26.169599767))
            ThreePointArc((-25.910625184, -26.169599767), (-18.523285067, -36.56455338), (-8.301229723, -44.18934447))
            ThreePointArc((-8.301229723, -44.18934447), (-0.271405212, -46.17502358), (7.758419299, -44.18934447))
            ThreePointArc((7.758419299, -44.18934447), (17.980474644, -36.56455338), (25.36781476, -26.169599767))
            ThreePointArc((25.36781476, -26.169599767), (34.733420126, 8.446713655), (30.051021288, 44.000600361))
            ThreePointArc((30.051021288, 44.000600361), (15.05140501, 47.321055953), (-0.271405212, 48.428034147))
        make_face()
    extrude(amount=EXTRUDE_4_DEPTH)

    # 草图5 → 凸台-拉伸5 (add)
    with BuildSketch(Plane.XZ.offset(-25).offset(EXTRUDE_START)):
        with BuildLine():
            ThreePointArc((15.323487668, 36.26928355), (-0.271405212, 46.17502358), (-15.866298092, 36.26928355))
            ThreePointArc((-15.866298092, 36.26928355), (-16.212731749, 30.227590505), (-12.285634009, 25.623247505))
            ThreePointArc((-12.285634009, 25.623247505), (-0.271405212, 22.664793676), (11.742823586, 25.623247505))
            ThreePointArc((11.742823586, 25.623247505), (15.669921326, 30.227590505), (15.323487668, 36.26928355))
        make_face()
    extrude(amount=-EXTRUDE_5_DEPTH)

    # 草图6 → 切除-拉伸1 (cut)
    with BuildSketch(Plane.XZ.offset(-5)):
        with BuildLine():
            Line((-15.724205973, 36.56455338), (-13.8705587, 36.56455338))
            ThreePointArc((-13.8705587, 36.56455338), (-0.271405212, 44.534003013), (13.327748276, 36.56455338))
            Line((13.327748276, 36.56455338), (15.18139555, 36.56455338))
            ThreePointArc((15.18139555, 36.56455338), (-0.271405212, 46.17502358), (-15.724205973, 36.56455338))
        make_face()
    extrude(amount=-CUT_EXTRUDE_1_DEPTH, mode=Mode.SUBTRACT)

    # 圆角1
    fillet_1_edges = [part_1.edges().sort_by_distance(p)[0] for p in [
        (-0.271405212, 7, 46.17502358),
    ]]
    fillet(fillet_1_edges, radius=FILLET_1_R)

    # 草图7 → 凸台-拉伸6 (add)
    with BuildSketch(Plane(origin=(0, 30, 0), x_dir=(1, 0, 0), z_dir=(0, 1, 0))):
        with Locations(Location((-0.271405212, 14.438151783, 0), (0, 0, 270))):
            Circle(SKETCH_7_R)
        with Locations(Location((-0.271405212, -30.637034449, 0), (0, 0, 270))):
            Circle(SKETCH_7_R_2)
    extrude(amount=EXTRUDE_6_DEPTH)

    # 草图8 → 凸台-拉伸7 (add)
    with BuildSketch(Plane(origin=(0, 32, 0), x_dir=(1, 0, 0), z_dir=(0, 1, 0))):
        with Locations(Location((-0.271405212, 14.438151783, 0), (0, 0, 270))):
            Circle(SKETCH_8_R)
    extrude(amount=EXTRUDE_7_DEPTH)


solid = part_1.part
